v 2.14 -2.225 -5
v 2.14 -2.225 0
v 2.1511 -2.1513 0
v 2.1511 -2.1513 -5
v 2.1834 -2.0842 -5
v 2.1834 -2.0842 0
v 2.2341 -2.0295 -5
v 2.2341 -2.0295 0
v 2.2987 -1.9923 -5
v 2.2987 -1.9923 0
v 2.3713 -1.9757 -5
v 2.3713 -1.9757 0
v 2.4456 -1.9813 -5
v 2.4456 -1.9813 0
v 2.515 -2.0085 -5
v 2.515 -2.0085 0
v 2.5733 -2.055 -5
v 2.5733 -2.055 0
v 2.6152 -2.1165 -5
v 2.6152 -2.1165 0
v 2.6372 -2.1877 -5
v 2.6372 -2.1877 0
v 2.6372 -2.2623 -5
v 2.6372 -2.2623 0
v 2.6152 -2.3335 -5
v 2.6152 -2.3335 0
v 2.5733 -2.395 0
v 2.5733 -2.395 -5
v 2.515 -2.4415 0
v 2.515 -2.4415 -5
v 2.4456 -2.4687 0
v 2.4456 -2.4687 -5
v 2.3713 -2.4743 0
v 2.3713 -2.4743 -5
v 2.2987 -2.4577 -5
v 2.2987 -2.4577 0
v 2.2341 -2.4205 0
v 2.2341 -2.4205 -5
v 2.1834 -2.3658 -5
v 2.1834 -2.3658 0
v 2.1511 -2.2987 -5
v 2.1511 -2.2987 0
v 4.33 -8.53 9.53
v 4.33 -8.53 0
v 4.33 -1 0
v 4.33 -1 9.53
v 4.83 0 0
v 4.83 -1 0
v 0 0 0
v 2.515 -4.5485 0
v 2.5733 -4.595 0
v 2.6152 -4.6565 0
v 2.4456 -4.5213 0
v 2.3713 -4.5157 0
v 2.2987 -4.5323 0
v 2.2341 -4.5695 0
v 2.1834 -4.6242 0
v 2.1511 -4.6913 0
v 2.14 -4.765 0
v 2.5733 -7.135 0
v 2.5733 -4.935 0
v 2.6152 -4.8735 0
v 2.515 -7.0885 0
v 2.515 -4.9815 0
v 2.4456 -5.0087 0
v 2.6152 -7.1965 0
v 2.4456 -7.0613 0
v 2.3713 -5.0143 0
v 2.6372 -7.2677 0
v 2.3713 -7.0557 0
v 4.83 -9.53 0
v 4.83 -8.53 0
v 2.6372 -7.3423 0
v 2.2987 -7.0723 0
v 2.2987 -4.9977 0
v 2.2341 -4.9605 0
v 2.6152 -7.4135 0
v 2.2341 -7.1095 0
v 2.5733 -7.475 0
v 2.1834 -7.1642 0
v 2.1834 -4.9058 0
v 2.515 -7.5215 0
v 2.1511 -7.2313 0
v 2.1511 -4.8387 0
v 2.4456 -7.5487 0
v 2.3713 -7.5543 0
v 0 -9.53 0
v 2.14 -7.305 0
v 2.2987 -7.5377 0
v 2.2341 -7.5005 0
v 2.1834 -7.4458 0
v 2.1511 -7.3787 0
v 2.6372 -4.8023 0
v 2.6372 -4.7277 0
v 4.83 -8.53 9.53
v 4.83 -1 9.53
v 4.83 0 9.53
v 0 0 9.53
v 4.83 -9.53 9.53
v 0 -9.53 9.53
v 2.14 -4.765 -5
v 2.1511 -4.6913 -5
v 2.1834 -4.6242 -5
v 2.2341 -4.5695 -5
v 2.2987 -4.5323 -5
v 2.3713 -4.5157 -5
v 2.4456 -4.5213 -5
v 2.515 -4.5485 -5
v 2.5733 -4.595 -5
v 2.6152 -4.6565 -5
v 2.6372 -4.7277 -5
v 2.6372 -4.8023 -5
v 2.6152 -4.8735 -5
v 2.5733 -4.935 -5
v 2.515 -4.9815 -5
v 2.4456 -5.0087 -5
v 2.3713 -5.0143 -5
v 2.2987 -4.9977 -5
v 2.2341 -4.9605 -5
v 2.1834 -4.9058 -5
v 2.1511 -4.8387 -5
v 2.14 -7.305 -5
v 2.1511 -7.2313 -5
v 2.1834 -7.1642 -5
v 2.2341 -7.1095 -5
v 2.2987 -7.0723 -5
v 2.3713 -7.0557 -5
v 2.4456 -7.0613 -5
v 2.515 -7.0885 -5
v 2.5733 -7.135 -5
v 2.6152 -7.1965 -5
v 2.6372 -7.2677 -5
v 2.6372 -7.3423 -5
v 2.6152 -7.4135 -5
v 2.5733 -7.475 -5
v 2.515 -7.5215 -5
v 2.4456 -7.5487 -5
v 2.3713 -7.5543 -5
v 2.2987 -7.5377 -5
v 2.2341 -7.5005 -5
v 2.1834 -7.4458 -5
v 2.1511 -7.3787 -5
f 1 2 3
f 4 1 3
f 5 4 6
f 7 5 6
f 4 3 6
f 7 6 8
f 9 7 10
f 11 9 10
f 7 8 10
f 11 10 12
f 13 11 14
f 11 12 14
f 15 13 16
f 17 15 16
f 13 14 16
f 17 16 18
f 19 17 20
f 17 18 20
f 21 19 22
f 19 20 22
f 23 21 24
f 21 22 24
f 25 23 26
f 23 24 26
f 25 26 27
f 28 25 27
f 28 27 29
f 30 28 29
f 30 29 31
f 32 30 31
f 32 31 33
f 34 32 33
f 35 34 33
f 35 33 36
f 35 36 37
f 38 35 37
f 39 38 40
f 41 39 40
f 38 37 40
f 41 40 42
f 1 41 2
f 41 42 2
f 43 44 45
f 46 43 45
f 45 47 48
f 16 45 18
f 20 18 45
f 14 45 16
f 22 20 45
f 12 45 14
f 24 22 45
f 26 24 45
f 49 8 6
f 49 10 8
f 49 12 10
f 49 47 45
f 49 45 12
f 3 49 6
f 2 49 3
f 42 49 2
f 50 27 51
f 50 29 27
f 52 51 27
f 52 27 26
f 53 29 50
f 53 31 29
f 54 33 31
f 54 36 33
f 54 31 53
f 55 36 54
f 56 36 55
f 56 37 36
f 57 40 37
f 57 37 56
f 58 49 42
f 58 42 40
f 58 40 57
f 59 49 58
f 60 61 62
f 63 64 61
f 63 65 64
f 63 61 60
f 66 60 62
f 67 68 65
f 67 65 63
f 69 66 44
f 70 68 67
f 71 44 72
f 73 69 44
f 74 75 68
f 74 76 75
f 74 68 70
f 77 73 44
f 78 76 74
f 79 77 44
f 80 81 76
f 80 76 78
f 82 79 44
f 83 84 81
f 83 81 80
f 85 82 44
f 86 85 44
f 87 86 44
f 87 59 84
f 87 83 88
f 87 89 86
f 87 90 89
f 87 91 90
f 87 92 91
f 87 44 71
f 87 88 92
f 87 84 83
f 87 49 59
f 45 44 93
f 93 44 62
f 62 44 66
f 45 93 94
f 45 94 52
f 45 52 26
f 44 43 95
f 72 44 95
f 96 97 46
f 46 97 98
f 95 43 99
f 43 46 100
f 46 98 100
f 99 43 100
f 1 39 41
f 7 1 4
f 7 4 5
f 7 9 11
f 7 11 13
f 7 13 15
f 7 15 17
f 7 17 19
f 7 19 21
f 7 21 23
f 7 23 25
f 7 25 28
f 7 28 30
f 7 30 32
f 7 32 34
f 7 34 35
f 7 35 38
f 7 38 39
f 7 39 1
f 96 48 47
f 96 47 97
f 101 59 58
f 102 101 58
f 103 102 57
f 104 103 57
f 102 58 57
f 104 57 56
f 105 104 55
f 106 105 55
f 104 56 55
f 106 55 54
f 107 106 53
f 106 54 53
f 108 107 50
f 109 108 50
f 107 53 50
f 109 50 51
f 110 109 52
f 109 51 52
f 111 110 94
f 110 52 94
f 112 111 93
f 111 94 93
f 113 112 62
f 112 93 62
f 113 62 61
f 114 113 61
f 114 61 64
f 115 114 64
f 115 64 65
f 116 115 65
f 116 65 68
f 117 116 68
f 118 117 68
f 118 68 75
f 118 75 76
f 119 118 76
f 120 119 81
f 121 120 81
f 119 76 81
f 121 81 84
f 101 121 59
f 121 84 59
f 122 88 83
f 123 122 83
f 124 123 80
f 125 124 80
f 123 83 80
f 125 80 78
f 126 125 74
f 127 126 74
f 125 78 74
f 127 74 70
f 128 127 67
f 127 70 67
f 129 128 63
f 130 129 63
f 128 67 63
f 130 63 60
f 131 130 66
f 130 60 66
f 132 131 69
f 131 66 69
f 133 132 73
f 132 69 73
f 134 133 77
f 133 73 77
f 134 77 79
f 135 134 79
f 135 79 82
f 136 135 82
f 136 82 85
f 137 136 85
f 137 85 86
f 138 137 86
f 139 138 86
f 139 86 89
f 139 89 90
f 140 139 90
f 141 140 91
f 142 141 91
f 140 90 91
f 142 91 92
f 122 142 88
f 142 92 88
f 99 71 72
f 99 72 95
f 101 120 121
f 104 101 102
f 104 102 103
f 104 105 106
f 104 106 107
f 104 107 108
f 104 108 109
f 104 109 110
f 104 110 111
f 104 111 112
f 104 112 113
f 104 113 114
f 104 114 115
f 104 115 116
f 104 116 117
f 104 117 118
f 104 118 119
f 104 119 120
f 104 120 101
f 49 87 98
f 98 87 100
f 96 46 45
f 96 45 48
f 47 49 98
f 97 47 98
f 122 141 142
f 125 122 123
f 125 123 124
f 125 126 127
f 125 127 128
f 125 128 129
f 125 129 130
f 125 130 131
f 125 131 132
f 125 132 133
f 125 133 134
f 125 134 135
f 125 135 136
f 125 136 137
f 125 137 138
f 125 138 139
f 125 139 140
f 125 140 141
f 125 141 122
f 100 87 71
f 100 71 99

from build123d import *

# Parameters (mm, degrees)
SKETCH1_W         = 9.53
SKETCH1_H         = 9.53
BASIC_SHAPE_DEPTH = 4.83
SKETCH5_R         = 0.25
PINS_DEPTH        = 5
SKETCH6_W         = 0.5
SKETCH6_H         = 7.53
REAR_RELIEF_DEPTH = 19.035262682


with BuildPart() as part:
    # Sketch1 → Basic Shape (new body)
    with BuildSketch(Plane(origin=(0, 0, 0), x_dir=(0, 0, 1), z_dir=(1, 0, 0))):
        with Locations((4.765, 4.765)):
            Rectangle(SKETCH1_W, SKETCH1_H)
    extrude(amount=BASIC_SHAPE_DEPTH)

    # Sketch5 → Pins (add)
    with BuildSketch(Plane(origin=(0, -19.06, 0), x_dir=(0, -1, 0), z_dir=(0, 0, -1))):
        with Locations(Location((-16.835, -2.39, 0), (0, 0, 90))):
            Circle(SKETCH5_R)
        with Locations(Location((-14.295, -2.39, 0), (0, 0, 90))):
            Circle(SKETCH5_R)
        with Locations(Location((-11.755, -2.39, 0), (0, 0, 90))):
            Circle(SKETCH5_R)
    extrude(amount=PINS_DEPTH)

    # Sketch6 → Rear Relief (cut, through all)
    with BuildSketch(Plane.XY.offset(9.53)):
        with Locations((4.58, -4.765)):
            Rectangle(SKETCH6_W, SKETCH6_H)
    extrude(amount=-REAR_RELIEF_DEPTH, mode=Mode.SUBTRACT)


solid = part.part
